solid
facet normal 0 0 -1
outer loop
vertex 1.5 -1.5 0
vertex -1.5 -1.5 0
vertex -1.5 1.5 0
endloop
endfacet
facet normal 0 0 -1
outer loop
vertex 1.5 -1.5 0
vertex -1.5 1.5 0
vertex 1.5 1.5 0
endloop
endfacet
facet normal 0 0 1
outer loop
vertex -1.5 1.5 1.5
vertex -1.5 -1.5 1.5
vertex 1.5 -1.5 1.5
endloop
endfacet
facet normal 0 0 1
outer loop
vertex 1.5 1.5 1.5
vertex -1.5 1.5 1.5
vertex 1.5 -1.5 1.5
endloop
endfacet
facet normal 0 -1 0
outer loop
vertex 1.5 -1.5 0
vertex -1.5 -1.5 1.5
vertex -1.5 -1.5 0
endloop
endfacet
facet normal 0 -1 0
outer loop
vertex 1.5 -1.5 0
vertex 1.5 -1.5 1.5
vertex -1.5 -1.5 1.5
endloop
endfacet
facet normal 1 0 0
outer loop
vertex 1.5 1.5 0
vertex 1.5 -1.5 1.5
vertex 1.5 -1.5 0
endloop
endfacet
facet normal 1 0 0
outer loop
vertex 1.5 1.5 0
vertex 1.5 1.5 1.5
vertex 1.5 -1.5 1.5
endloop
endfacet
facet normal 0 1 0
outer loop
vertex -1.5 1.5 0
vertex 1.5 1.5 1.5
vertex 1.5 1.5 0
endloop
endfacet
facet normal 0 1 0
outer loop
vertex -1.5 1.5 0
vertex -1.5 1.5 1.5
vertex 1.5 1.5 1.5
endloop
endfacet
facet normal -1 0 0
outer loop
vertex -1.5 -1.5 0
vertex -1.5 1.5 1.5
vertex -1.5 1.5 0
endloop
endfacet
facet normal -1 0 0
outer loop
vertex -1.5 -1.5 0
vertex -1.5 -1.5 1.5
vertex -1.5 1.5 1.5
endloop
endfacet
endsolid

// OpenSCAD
// datasheet: https://www.tme.eu/Document/e39540ac51bab732bf0cd6d66b280881/DJNR3015-series.pdf
CHASSIS_X_LENGTH = (2 * 0.9) + 1.2;
CHASSIS_Y_LENGTH = 3;
CHASSIS_Z_LENGTH = 1.5;

// Increase steps in render to have quality circles
$fs=0.01;


module Transformer() {
    
    linear_extrude(height = CHASSIS_Z_LENGTH, convexity = 10, twist = 0)
translate([-CHASSIS_X_LENGTH/2, -CHASSIS_Y_LENGTH/2,0])
        square([CHASSIS_X_LENGTH,CHASSIS_Y_LENGTH]);
}

Transformer();
